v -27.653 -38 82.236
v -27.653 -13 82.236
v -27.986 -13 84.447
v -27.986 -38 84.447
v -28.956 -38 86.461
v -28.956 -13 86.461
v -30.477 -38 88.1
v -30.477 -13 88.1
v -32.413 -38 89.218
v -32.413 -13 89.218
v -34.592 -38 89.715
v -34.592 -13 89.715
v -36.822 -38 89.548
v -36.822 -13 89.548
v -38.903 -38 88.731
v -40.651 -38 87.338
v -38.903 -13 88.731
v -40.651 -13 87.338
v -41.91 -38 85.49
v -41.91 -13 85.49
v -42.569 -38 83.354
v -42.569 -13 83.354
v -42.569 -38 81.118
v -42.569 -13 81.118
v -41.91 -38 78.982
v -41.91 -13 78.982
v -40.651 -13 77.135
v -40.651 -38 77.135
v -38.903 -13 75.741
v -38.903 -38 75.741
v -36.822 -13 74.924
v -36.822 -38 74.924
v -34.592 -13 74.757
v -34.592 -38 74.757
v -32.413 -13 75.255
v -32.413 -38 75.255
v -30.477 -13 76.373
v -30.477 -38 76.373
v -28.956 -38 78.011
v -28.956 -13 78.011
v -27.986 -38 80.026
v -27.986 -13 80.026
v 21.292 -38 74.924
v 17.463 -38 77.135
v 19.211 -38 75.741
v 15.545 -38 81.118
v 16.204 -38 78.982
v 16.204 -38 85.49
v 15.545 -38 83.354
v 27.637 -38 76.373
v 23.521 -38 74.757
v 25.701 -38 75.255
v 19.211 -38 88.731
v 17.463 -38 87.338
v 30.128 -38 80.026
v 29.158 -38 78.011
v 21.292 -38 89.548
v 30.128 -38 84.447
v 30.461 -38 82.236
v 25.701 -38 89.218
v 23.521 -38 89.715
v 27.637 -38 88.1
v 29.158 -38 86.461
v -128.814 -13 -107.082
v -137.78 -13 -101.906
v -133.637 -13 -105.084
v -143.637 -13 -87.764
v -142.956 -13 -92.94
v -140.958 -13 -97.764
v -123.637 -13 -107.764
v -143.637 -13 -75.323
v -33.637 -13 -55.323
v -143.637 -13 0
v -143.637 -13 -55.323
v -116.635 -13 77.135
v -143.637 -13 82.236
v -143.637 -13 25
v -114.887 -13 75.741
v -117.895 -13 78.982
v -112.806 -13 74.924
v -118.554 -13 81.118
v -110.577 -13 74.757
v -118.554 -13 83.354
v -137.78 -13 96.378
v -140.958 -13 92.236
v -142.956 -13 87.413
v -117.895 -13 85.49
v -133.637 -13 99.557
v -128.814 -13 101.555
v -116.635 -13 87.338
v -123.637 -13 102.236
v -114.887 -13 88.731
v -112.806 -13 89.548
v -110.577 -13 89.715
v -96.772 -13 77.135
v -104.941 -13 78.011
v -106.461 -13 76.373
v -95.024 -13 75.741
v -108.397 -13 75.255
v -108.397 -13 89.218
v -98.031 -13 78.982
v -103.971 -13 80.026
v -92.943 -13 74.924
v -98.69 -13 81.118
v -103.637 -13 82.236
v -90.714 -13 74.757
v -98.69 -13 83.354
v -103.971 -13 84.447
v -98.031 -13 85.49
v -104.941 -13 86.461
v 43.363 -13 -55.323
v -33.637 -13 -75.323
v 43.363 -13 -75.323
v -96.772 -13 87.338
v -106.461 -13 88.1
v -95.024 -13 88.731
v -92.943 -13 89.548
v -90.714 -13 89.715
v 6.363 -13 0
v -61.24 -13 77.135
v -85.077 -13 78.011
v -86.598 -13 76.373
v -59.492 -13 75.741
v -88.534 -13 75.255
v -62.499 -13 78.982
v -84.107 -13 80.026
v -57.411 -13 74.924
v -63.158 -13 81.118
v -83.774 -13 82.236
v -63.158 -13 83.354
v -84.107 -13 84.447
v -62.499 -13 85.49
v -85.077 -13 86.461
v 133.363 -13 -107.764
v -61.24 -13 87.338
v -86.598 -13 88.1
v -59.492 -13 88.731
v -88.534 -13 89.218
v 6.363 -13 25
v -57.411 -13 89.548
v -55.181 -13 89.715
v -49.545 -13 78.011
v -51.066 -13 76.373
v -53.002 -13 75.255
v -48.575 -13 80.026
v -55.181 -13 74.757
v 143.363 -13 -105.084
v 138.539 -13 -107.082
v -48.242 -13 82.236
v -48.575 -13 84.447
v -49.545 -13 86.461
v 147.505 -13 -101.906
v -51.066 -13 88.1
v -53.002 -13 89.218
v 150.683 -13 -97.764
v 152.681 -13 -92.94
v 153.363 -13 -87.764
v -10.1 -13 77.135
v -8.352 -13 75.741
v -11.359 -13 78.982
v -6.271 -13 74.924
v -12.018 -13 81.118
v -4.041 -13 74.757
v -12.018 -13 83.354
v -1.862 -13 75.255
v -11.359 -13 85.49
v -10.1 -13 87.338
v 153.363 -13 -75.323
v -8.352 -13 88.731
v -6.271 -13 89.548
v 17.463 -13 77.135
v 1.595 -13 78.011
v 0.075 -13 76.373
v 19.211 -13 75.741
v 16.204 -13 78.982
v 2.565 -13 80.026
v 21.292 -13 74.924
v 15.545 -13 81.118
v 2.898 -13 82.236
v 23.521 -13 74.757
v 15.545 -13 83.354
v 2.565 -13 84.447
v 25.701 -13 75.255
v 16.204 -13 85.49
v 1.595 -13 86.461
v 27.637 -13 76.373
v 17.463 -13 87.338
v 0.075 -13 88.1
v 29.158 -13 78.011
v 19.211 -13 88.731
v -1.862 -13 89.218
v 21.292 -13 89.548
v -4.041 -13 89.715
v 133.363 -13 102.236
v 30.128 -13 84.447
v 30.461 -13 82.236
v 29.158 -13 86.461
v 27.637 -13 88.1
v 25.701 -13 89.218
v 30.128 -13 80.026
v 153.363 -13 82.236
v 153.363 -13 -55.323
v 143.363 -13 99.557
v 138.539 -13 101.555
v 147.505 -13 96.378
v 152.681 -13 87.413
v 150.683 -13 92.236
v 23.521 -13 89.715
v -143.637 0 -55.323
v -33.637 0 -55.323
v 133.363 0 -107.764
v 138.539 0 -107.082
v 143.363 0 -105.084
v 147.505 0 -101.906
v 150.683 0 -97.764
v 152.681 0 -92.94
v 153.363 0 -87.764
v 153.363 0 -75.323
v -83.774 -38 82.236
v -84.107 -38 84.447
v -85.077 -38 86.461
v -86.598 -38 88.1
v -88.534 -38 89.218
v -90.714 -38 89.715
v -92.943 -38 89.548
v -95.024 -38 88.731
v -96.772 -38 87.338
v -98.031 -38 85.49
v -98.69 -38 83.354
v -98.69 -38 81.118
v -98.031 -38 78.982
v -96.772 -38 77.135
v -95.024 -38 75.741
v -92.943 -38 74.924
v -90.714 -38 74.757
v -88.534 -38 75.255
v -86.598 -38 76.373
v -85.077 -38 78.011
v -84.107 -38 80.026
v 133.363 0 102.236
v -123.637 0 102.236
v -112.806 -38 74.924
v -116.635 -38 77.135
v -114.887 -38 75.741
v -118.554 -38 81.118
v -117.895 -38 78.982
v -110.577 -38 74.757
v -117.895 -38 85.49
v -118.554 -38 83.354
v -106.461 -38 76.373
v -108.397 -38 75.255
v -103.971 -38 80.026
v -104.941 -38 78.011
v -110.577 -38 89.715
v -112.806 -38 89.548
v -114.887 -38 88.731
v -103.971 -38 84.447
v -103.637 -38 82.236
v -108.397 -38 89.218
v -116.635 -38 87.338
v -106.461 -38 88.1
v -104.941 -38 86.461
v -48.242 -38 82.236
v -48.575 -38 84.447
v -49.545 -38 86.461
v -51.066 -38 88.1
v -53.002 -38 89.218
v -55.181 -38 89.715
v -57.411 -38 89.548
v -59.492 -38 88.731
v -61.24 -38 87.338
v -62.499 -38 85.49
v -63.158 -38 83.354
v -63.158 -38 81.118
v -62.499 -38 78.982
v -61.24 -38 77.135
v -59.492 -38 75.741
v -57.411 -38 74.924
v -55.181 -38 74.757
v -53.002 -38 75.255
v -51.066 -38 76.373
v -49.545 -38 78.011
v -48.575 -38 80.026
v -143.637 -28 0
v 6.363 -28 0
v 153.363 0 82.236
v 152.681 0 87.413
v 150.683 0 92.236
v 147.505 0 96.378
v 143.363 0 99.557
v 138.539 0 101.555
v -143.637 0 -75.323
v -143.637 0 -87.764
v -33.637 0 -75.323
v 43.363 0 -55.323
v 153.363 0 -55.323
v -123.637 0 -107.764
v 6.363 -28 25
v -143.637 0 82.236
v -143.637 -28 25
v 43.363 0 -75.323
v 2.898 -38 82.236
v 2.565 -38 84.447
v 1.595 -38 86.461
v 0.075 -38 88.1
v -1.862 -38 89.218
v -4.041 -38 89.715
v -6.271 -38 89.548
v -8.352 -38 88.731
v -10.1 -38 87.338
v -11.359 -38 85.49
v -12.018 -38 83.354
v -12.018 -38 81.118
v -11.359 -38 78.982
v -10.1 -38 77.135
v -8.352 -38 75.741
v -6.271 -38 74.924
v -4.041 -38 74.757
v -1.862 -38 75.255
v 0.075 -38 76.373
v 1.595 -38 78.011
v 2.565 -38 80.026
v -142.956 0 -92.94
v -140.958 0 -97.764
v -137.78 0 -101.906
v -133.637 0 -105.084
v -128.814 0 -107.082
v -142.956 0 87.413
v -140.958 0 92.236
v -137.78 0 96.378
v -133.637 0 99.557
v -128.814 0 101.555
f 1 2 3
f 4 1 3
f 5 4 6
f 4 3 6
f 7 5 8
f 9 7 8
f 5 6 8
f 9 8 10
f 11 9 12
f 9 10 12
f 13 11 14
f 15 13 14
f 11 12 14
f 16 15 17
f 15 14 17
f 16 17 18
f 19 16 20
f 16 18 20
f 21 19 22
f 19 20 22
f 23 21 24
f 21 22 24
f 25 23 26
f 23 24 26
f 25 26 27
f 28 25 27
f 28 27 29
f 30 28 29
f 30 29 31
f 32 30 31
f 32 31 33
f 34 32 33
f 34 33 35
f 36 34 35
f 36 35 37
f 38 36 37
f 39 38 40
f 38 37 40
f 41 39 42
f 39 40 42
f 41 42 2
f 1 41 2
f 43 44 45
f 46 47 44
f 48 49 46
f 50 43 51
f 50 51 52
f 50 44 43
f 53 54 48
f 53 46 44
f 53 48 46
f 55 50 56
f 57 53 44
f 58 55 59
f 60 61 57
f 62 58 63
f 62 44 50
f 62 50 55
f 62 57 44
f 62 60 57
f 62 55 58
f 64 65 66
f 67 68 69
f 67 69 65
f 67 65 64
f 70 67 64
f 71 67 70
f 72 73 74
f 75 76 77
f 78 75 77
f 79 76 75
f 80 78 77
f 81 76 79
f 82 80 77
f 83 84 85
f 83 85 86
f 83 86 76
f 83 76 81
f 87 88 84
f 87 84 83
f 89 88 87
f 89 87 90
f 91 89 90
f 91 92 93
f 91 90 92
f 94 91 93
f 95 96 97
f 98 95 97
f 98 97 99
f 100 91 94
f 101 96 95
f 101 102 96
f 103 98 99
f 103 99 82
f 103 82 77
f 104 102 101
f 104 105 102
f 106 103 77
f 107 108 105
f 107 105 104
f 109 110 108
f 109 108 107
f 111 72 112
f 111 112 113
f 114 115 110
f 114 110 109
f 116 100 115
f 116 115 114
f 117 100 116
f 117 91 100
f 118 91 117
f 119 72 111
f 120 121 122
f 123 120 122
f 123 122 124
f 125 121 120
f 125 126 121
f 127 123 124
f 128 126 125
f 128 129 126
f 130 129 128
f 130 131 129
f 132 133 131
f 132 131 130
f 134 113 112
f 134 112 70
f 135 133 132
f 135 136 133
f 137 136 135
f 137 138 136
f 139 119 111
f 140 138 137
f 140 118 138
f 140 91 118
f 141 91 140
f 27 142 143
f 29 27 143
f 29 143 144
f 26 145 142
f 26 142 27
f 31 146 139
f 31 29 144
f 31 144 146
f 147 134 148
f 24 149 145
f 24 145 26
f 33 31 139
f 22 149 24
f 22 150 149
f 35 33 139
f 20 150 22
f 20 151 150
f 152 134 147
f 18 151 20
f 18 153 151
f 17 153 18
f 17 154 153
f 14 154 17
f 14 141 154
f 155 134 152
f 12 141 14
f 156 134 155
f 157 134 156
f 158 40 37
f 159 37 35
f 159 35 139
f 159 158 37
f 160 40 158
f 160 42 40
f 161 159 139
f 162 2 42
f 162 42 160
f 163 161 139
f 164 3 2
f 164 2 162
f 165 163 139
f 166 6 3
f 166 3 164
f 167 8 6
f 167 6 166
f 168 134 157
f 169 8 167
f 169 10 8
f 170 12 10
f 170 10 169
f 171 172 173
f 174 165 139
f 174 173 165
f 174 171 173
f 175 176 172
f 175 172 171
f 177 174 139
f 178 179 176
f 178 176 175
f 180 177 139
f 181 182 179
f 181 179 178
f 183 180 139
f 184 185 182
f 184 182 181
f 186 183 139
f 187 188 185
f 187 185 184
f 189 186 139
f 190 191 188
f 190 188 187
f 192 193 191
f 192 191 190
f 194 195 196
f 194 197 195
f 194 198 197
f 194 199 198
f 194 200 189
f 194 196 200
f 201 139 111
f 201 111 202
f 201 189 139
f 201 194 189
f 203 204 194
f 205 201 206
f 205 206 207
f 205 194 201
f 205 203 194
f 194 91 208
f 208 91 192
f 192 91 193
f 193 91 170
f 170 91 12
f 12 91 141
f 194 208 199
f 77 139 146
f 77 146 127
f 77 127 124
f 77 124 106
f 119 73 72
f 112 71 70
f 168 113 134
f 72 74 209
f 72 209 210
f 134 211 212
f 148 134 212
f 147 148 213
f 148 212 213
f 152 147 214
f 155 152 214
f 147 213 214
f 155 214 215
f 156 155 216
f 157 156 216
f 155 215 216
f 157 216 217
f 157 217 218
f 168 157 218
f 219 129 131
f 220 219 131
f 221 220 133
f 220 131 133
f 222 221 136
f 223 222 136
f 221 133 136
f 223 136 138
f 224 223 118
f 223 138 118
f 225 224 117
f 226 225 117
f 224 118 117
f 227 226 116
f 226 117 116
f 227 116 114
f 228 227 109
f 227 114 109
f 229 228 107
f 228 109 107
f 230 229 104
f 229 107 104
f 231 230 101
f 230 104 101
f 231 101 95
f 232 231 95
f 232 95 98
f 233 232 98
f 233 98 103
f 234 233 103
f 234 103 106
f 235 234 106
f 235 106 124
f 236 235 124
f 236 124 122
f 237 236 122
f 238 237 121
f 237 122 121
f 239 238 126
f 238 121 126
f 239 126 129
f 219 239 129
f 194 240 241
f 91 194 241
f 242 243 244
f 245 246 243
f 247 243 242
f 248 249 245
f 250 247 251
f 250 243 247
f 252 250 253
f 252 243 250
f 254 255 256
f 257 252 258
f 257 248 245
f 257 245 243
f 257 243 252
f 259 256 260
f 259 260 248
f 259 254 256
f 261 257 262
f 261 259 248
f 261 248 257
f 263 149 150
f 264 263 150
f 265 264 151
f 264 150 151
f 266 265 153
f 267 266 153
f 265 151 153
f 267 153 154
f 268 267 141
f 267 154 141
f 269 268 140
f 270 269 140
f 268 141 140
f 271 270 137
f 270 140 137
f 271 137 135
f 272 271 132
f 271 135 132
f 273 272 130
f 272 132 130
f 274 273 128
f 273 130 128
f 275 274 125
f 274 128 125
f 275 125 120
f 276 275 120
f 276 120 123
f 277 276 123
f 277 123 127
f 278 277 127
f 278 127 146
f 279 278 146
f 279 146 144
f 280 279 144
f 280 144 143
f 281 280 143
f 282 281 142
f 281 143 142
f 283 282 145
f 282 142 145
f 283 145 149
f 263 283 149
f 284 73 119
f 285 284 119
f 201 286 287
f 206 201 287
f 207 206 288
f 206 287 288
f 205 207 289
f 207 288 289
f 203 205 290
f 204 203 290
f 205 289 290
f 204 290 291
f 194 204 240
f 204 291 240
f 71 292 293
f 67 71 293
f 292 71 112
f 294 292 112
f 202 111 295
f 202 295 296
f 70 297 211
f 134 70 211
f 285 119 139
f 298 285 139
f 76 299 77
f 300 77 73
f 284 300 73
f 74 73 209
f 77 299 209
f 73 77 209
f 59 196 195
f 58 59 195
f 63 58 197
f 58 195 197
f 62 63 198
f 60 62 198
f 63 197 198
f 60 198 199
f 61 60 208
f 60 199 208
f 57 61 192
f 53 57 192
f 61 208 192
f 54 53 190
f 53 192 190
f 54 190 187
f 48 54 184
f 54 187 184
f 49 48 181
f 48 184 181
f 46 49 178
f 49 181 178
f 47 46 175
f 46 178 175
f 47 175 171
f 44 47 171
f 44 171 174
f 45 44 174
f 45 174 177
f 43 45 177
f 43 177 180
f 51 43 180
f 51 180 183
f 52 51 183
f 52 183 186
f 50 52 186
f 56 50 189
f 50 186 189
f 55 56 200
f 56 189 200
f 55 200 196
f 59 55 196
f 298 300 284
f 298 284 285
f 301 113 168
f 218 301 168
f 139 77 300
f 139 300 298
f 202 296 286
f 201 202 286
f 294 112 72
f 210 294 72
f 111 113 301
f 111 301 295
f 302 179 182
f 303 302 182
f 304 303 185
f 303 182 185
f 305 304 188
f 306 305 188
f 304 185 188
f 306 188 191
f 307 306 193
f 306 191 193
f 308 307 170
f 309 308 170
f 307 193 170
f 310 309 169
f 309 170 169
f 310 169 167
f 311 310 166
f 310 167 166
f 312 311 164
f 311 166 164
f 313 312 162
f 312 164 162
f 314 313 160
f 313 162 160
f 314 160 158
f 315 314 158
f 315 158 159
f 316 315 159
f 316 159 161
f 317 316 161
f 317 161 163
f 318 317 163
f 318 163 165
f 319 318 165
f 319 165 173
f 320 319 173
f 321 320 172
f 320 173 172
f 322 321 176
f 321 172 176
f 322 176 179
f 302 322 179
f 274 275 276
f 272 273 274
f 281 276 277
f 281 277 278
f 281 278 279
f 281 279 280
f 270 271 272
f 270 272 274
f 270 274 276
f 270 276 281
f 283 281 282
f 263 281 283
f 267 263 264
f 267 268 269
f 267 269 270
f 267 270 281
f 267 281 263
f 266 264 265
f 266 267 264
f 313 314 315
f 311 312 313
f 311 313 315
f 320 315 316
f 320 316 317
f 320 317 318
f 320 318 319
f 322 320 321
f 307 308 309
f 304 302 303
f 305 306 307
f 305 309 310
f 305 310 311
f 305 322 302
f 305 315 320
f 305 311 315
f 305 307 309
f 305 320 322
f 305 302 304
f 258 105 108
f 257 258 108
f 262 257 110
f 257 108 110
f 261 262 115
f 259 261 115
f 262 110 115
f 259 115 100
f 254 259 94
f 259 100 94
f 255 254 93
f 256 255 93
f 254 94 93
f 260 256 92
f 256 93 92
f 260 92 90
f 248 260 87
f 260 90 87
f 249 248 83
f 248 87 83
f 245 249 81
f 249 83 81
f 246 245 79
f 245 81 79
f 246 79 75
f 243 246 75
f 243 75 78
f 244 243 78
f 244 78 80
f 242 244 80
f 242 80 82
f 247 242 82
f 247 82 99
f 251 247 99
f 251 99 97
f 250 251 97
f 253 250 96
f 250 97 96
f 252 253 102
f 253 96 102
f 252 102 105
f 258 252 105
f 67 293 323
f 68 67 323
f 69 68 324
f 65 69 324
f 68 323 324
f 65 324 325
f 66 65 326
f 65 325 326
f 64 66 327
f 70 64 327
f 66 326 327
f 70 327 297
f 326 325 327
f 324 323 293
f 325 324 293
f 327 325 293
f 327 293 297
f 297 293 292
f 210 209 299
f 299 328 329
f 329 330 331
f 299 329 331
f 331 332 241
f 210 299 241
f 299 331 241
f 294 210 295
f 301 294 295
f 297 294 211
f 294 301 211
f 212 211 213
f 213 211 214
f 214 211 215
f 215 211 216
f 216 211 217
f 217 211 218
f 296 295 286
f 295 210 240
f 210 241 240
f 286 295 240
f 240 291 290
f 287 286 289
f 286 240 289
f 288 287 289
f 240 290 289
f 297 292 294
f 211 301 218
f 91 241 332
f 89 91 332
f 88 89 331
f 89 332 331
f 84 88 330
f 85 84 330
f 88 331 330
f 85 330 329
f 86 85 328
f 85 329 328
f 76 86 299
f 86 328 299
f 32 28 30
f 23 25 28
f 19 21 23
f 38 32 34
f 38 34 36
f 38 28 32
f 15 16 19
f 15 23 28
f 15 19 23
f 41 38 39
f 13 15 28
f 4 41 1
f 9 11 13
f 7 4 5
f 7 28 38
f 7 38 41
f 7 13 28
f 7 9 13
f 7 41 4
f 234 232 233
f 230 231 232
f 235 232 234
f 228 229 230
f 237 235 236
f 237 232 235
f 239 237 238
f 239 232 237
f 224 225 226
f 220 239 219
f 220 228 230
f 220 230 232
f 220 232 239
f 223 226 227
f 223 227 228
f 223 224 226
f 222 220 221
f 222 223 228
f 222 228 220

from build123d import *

# Parameters (mm, degrees)
F1_DEPTH = 13
F2_W     = 110
F2_H     = 20
F3_DEPTH = 25
F4_W     = 150
F4_H     = 25
F5_DEPTH = 15
F6_R     = 7.5
F7_DEPTH = 25


with BuildPart() as f1:
    # F0 (on Front) → F1 (new body)
    with BuildSketch(Plane.XZ):
        with BuildLine():
            Line((133.362575, 102.236308), (-123.637425, 102.236308))
            ThreePointArc((-123.637425, 102.236308), (-137.779561, 96.378444), (-143.637425, 82.236308))
            Line((-143.637425, 82.236308), (-143.637425, -61.831403))
            Line((-143.637425, -61.831403), (-143.637425, -81.831403))
            Line((-143.637425, -81.831403), (-143.637425, -87.763692))
            ThreePointArc((-143.637425, -87.763692), (-137.779561, -101.905827), (-123.637425, -107.763692))
            Line((-123.637425, -107.763692), (133.362575, -107.763692))
            ThreePointArc((133.362575, -107.763692), (147.50471, -101.905827), (153.362575, -87.763692))
            Line((153.362575, -87.763692), (153.362575, -81.831403))
            Line((153.362575, -81.831403), (153.362575, -61.831403))
            Line((153.362575, -61.831403), (153.362575, 82.236308))
            ThreePointArc((153.362575, 82.236308), (147.50471, 96.378444), (133.362575, 102.236308))
        make_face()
    extrude(amount=F1_DEPTH)

    # F2 (on face) → F3 (cut)
    with BuildSketch(Plane.XZ.offset(13)):
        with Locations((-88.637425, -65.322807)):
            Rectangle(F2_W, F2_H)
        with Locations((98.362575, -65.322807)):
            Rectangle(F2_W, F2_H)
    extrude(amount=-F3_DEPTH, mode=Mode.SUBTRACT)

    # F4 (on face) → F5 (join)
    with BuildSketch(Plane.XZ.offset(13)):
        with Locations((-68.637425, 12.5)):
            Rectangle(F4_W, F4_H)
    extrude(amount=F5_DEPTH)

    # F6 (on face) → F7 (join)
    with BuildSketch(Plane.XZ.offset(13)):
        with Locations((-111.137425, 82.236308)):
            Circle(F6_R)
        with Locations((-91.274098, 82.236308)):
            Circle(F6_R)
        with Locations((-55.741716, 82.236308)):
            Circle(F6_R)
        with Locations((-35.15286, 82.236308)):
            Circle(F6_R)
        with Locations((-4.601658, 82.236308)):
            Circle(F6_R)
        with Locations((22.960842, 82.236308)):
            Circle(F6_R)
    extrude(amount=F7_DEPTH)


solid = f1.part
